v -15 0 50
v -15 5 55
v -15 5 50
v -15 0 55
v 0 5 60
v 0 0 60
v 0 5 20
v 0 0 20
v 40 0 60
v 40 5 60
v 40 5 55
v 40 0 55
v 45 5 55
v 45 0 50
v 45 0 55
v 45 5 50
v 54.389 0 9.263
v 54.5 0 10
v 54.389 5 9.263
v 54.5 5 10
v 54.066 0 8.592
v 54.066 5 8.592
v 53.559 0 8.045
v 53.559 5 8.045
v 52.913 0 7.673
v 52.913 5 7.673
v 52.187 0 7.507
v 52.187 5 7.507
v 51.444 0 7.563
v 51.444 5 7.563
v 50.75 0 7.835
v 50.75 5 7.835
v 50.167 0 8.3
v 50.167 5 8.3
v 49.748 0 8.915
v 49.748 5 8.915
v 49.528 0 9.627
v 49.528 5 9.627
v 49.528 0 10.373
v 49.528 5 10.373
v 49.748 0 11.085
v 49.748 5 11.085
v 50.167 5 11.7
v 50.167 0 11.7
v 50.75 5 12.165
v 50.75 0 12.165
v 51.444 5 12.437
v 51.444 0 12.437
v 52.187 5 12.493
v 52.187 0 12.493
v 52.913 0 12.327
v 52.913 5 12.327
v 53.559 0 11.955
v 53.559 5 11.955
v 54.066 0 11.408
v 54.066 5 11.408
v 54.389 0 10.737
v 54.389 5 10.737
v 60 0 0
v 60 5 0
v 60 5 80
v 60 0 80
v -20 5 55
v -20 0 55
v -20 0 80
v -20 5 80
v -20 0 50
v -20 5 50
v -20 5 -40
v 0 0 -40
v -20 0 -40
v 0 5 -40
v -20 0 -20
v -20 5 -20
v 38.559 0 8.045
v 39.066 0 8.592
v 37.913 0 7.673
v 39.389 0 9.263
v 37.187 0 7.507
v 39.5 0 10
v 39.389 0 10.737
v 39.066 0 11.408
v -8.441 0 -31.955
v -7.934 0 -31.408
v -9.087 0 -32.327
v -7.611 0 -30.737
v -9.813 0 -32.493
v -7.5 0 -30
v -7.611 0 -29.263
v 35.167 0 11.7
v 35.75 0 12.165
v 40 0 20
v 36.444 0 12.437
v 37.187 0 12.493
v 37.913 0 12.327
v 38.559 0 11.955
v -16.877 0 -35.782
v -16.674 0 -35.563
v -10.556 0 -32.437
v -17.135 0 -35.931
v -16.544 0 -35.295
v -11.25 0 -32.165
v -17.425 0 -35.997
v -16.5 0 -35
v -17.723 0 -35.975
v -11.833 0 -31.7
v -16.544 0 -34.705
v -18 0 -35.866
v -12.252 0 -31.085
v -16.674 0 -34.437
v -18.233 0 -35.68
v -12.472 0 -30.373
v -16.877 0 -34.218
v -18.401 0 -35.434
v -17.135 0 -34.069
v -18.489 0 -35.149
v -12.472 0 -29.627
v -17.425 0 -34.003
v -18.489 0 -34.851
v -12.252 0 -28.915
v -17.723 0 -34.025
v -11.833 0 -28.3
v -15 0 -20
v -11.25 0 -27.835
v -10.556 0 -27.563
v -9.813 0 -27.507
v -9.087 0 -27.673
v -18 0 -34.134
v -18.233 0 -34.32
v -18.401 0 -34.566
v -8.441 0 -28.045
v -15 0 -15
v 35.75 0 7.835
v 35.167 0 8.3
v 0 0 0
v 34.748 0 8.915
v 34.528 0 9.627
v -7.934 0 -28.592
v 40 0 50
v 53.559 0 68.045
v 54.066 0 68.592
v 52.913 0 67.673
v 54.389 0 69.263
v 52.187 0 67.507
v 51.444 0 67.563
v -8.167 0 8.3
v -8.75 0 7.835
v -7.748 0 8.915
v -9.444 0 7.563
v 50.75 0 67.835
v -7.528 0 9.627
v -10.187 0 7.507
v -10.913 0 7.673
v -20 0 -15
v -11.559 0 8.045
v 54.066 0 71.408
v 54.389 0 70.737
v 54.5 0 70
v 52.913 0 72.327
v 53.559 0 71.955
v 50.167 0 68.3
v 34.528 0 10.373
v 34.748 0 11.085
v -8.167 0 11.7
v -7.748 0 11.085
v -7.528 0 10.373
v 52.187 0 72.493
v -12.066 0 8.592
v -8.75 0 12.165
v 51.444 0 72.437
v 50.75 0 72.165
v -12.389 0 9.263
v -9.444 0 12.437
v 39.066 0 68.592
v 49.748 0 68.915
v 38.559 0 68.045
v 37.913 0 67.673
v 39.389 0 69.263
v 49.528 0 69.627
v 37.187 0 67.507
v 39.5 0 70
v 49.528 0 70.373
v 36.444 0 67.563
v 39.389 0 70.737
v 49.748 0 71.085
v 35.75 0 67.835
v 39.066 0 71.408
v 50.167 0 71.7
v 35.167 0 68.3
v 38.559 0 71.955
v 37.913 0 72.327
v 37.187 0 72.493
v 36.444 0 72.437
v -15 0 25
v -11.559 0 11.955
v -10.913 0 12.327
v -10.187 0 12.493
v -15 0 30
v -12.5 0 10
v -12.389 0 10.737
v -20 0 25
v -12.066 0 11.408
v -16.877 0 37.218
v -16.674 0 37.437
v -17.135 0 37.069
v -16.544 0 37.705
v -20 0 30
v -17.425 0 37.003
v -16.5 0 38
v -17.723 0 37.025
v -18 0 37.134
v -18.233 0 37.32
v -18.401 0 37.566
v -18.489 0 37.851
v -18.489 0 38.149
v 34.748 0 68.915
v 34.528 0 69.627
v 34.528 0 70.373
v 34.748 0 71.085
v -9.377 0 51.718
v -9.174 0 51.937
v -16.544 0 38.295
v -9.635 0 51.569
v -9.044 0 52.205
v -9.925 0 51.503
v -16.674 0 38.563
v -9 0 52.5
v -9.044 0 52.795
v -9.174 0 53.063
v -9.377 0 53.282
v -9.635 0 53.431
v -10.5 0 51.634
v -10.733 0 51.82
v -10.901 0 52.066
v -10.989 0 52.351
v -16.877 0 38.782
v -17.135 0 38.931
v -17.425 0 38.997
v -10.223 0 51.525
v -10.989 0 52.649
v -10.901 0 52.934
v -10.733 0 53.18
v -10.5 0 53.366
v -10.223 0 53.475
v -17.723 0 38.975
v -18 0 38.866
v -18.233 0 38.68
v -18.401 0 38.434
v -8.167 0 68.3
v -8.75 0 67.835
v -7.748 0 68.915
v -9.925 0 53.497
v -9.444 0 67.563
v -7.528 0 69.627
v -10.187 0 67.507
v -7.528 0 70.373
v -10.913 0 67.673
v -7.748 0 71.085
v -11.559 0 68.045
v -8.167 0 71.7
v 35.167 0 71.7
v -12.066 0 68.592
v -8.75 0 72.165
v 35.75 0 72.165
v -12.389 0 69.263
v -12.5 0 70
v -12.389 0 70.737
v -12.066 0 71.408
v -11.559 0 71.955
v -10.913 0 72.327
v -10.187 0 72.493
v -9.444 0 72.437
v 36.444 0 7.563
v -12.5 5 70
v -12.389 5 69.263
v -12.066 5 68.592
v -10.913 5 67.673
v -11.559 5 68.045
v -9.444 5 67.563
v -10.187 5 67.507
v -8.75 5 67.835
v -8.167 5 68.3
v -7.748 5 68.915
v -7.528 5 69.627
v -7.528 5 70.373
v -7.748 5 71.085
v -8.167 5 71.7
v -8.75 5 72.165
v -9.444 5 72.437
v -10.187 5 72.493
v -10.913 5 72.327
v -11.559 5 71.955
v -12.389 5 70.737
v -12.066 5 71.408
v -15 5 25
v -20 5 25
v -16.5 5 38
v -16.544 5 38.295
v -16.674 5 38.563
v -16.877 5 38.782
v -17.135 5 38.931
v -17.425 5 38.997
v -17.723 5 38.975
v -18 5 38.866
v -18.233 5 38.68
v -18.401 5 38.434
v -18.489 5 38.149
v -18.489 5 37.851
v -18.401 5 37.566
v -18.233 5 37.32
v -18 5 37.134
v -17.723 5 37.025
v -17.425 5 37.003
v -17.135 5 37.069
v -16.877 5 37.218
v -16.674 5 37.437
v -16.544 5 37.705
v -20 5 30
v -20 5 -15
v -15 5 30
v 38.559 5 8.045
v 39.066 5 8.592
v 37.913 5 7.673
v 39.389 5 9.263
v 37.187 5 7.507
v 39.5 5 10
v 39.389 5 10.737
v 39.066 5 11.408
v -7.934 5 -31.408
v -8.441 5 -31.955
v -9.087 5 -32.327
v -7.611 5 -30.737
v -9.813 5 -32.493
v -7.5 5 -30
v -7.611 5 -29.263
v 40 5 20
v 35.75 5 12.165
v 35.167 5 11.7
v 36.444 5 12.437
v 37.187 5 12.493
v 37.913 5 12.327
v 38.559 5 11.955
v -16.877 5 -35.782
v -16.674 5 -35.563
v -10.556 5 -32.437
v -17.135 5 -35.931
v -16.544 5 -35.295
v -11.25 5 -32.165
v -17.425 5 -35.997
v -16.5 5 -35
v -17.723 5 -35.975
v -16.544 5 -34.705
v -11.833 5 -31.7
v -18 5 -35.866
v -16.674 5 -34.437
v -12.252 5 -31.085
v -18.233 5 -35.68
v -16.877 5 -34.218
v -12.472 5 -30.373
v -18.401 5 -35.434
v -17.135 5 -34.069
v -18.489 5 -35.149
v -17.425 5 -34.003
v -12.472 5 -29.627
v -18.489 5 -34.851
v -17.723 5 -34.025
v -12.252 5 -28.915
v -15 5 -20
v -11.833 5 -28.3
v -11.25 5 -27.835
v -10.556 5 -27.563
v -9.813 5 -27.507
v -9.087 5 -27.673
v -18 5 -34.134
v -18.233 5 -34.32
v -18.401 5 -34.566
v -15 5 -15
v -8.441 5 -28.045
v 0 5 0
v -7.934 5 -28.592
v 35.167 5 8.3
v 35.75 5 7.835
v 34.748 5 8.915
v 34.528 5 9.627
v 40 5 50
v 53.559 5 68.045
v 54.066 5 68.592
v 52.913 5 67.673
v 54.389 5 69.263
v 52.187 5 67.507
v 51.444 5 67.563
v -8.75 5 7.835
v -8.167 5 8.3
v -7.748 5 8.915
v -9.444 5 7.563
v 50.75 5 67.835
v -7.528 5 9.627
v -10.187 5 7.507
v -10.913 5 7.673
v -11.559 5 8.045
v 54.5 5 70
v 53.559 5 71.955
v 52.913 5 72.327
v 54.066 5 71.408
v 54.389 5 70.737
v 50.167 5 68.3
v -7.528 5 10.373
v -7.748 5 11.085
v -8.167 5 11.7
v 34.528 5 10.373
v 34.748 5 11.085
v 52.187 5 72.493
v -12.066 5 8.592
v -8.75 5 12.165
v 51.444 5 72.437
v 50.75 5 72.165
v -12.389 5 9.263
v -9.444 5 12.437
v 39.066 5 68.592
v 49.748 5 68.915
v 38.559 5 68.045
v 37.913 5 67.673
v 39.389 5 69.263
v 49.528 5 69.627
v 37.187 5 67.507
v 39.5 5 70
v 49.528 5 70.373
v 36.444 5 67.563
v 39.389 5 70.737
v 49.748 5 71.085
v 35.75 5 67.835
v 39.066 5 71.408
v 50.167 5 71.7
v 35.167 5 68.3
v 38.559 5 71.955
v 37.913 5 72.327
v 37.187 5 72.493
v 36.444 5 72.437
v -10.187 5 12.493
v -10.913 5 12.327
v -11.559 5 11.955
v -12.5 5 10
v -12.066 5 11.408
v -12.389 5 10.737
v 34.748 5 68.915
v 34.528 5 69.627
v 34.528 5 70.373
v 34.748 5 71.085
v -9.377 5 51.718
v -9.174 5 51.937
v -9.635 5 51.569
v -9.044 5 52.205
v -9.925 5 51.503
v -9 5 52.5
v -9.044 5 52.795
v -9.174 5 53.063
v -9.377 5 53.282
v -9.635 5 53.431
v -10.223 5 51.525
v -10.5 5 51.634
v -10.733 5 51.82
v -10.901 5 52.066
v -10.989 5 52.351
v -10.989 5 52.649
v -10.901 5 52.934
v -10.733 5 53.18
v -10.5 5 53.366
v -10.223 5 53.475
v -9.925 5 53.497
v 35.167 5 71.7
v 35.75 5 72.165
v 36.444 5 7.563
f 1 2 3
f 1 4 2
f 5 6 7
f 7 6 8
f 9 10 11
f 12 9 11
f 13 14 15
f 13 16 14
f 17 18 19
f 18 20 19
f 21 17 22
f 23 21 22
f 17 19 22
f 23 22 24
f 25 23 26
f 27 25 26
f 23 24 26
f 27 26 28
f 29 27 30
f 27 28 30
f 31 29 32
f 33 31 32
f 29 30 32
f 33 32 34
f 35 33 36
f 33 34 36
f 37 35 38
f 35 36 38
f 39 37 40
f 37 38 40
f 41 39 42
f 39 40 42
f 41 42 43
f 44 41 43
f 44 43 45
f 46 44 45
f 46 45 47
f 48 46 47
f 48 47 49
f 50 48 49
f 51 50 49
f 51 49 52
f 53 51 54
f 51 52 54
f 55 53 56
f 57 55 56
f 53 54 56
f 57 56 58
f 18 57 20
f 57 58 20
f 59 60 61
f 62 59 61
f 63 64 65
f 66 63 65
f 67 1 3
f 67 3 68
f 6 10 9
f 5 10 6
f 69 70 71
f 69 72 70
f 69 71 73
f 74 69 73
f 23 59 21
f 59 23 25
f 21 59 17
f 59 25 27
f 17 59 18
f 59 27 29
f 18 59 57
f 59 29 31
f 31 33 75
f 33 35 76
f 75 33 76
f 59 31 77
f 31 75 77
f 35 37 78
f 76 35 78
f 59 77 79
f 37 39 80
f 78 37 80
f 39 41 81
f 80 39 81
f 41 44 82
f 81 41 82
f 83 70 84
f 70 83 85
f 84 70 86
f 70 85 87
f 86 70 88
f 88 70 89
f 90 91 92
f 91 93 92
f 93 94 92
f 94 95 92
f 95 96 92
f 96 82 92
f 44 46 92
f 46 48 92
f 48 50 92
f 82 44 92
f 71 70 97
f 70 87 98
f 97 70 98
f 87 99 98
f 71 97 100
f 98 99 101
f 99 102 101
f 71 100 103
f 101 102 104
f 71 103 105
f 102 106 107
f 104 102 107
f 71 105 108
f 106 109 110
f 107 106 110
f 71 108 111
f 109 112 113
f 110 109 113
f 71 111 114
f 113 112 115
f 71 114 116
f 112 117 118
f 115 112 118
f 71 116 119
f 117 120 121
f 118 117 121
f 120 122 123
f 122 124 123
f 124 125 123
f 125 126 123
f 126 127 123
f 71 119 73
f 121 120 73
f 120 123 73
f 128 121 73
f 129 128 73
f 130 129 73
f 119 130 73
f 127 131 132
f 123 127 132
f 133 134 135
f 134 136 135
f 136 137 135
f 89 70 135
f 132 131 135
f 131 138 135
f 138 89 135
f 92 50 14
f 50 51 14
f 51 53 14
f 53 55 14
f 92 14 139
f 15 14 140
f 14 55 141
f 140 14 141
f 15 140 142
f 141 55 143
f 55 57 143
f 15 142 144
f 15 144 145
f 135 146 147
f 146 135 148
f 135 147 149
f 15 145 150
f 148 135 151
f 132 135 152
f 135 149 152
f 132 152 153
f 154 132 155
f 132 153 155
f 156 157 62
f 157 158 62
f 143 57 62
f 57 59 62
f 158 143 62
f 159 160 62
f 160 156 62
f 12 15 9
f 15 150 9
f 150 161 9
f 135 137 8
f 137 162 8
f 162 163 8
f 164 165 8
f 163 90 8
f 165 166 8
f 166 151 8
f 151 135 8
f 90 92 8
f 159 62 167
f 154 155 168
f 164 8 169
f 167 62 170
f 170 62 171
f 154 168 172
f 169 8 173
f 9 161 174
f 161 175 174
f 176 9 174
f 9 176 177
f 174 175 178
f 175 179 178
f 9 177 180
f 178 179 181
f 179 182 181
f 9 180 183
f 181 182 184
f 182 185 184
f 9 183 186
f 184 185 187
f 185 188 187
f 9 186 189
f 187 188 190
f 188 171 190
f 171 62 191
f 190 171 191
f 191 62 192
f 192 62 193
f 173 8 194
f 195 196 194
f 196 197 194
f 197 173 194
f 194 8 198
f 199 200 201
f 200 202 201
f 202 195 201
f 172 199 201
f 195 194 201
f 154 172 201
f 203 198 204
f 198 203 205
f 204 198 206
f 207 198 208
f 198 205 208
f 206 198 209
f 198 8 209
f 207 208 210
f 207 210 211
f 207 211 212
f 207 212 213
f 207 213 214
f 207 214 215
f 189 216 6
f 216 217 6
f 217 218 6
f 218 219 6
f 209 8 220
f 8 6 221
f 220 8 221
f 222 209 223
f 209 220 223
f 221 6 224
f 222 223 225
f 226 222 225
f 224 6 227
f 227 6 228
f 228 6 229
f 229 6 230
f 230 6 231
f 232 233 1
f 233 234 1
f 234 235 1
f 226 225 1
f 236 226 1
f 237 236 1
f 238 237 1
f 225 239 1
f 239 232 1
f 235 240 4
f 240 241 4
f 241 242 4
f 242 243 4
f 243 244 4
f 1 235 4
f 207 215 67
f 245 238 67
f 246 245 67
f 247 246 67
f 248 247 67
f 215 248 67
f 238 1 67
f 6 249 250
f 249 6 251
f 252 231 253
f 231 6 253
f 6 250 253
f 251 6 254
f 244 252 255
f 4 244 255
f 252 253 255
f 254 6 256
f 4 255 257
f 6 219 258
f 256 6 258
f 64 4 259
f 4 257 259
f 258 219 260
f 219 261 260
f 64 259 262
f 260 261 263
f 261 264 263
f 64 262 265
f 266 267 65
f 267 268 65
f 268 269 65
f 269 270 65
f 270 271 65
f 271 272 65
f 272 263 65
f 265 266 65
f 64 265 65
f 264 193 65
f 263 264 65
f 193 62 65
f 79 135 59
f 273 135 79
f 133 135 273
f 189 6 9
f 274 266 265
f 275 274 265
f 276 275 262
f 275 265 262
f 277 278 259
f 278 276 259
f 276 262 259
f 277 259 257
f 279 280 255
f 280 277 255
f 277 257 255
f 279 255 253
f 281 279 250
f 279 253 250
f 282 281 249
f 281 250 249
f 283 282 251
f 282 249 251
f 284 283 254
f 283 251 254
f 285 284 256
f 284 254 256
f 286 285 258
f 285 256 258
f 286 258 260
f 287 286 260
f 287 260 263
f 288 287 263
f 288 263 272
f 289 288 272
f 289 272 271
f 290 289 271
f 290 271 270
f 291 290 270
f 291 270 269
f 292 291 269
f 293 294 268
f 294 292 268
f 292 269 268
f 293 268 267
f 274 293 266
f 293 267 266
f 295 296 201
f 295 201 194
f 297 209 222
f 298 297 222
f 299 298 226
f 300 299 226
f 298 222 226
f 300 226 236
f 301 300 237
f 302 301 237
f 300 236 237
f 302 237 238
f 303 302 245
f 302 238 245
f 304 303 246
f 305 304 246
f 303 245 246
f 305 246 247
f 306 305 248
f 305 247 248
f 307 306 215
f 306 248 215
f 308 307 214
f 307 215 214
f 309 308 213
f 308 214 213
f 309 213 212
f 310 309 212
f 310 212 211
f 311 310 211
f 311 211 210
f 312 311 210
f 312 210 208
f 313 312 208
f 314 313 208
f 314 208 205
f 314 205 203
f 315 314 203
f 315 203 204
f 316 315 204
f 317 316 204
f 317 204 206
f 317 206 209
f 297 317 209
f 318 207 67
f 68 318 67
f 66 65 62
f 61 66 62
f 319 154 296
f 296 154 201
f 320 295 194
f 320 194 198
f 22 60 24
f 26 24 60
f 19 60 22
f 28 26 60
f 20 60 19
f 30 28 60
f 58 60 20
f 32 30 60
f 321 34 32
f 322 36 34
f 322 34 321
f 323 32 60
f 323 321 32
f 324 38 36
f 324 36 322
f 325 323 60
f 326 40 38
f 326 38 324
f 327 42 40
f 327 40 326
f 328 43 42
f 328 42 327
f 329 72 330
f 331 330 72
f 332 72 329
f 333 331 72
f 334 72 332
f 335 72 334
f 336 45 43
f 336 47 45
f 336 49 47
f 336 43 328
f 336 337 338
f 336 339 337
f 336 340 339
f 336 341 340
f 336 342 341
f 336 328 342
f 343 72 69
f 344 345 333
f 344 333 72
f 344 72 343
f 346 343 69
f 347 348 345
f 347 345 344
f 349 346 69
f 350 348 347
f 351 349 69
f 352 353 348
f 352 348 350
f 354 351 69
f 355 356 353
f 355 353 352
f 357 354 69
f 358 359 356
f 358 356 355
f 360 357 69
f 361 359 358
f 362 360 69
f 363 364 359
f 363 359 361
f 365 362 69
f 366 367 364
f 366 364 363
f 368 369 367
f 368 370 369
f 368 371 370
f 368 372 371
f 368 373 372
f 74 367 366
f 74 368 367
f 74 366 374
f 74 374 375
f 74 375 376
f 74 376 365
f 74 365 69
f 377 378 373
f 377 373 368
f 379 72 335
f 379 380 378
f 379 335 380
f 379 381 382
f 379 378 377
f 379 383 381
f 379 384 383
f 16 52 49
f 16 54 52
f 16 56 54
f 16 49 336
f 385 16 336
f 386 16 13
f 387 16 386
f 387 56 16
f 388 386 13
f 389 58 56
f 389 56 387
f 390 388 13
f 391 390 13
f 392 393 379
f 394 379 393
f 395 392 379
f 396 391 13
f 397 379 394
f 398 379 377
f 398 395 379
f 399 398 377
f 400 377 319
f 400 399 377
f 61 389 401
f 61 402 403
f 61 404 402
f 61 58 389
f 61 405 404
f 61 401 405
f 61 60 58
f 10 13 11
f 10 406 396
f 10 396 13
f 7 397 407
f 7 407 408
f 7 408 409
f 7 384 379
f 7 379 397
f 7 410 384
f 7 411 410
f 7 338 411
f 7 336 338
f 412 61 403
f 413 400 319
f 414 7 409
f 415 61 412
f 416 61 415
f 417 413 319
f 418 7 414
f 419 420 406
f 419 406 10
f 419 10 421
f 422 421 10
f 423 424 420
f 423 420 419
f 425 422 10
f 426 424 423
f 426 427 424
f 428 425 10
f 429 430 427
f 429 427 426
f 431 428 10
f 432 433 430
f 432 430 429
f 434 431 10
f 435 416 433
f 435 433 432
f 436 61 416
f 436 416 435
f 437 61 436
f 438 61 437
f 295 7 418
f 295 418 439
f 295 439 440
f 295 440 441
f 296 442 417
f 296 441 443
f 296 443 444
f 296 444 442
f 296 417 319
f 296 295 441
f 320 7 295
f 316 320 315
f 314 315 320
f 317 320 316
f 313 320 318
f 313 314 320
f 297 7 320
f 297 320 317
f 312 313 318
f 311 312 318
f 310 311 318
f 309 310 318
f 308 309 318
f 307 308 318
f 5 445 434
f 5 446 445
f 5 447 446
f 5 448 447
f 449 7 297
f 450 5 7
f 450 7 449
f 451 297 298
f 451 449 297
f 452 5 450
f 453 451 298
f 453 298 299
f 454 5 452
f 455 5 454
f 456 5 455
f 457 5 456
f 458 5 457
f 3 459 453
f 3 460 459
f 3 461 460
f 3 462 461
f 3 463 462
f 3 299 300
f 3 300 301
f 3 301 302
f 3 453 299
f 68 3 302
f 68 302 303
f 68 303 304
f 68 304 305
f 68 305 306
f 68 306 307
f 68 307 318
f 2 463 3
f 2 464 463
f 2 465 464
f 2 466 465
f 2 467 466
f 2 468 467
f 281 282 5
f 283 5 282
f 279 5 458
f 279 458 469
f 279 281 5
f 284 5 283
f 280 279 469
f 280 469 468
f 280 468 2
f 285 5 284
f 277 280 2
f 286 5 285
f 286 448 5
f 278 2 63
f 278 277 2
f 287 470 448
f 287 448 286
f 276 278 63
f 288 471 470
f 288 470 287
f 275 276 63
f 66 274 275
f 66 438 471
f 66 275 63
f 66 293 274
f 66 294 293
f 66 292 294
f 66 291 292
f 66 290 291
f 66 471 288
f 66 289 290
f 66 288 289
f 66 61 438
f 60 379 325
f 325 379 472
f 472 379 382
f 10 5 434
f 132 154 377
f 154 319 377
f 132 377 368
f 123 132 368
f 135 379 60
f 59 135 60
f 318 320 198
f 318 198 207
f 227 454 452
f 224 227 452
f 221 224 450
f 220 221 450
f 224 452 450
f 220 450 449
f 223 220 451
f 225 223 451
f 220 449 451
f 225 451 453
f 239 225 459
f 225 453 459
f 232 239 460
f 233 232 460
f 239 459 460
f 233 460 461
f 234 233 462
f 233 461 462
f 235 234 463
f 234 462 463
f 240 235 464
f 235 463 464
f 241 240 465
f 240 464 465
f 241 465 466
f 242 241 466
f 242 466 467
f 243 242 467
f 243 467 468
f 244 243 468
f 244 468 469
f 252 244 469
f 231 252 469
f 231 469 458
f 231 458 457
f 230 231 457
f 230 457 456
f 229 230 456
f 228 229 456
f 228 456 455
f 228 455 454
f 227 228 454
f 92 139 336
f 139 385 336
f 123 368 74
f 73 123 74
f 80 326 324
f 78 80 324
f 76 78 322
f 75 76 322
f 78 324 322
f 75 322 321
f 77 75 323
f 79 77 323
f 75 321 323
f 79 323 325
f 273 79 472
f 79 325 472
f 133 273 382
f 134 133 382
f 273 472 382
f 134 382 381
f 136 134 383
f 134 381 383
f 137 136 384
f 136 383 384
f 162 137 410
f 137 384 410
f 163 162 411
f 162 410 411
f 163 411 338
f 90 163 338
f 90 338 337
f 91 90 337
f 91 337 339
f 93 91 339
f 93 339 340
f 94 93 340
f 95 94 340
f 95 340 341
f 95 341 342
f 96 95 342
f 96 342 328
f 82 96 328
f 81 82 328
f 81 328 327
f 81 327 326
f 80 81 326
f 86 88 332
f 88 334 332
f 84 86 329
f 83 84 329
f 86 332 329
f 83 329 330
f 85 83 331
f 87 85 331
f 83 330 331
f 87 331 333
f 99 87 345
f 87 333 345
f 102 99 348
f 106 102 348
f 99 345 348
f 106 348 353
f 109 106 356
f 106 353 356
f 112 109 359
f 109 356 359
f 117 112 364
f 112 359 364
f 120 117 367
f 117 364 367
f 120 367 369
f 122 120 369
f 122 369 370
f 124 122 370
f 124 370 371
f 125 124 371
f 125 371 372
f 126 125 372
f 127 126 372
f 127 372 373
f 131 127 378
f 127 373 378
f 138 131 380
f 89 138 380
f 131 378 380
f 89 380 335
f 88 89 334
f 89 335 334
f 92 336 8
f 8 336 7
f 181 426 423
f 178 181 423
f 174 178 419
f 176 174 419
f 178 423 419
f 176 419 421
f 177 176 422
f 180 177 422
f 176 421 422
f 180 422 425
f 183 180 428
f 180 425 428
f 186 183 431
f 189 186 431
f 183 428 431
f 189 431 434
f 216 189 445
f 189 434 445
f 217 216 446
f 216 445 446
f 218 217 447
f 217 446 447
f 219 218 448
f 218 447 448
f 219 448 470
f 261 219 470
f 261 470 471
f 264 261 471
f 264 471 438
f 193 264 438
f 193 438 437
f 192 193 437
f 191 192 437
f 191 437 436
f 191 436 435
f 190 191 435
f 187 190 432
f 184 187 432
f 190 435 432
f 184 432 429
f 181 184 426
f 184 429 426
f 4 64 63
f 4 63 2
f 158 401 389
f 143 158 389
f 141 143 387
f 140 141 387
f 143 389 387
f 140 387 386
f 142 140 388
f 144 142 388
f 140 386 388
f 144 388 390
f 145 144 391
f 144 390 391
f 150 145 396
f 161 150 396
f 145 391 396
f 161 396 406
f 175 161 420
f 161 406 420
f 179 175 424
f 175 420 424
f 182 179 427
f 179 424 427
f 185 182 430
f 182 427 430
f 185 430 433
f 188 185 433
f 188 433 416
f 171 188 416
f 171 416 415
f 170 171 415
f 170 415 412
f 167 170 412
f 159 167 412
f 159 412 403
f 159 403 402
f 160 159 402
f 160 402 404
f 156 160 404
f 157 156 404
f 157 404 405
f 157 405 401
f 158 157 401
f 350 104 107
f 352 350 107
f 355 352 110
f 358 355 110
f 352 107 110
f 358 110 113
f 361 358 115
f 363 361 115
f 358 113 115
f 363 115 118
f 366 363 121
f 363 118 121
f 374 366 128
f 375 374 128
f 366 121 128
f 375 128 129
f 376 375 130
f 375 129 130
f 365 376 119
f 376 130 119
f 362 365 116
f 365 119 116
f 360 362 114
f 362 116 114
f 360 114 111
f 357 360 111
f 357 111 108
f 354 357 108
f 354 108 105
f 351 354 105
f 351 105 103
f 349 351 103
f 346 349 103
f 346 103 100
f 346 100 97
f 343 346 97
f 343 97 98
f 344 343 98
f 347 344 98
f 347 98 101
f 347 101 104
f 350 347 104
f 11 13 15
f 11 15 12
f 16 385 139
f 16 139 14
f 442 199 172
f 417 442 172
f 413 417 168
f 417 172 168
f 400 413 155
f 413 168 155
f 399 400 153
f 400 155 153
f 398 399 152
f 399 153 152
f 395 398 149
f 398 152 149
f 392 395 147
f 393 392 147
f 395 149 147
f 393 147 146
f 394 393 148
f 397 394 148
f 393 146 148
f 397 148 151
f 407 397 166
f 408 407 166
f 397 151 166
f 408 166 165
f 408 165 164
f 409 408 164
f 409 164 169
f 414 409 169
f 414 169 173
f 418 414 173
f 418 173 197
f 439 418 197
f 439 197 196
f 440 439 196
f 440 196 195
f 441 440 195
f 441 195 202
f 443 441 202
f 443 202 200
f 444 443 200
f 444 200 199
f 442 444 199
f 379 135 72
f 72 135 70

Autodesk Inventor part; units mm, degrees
ref_plane "YZ Plane" through (0, 0, 0) normal (1, 0, 0) x (0, 1, 0)
ref_plane "XZ Plane" through (0, 0, 0) normal (0, 1, 0) x (-1, 0, 0)
ref_plane "XY Plane" through (0, 0, 0) normal (0, 0, 1) x (1, 0, 0)
sketch "Sketch4" plane through (0, 0, 0) normal (0, 1, 0) x (-1, 0, 0)
  line L0 (0, 0) -> (20, 0)
  line L1 (20, 0) -> (20, 80)
  line L2 (20, 80) -> (0, 80)
  line L3 (0, 80) -> (0, 0)
  circle A0 centre (10, 10) radius 2.5
  circle A1 centre (10, 70) radius 2.5
  circle A2 centre (10, 70) radius 2.5
  line L4 (0, 0) -> (20, 0)
  line L5 (20, 0) -> (20, -40)
  line L6 (20, -40) -> (0, -40)
  line L7 (0, -40) -> (0, 0)
  circle A3 centre (10, -30) radius 2.5
  dimension "d0" = 80
  dimension "d3" = 20
  dimension "d4" = 5
  dimension "d5" = 10
  dimension "d6" = 10
  dimension "d7" = 5
  dimension "d8" = 10
  dimension "d9" = 10
  dimension "d12" = 5
  dimension "d13" = 60
  dimension "d16" = 40
  dimension "d17" = 5
  dimension "d18" = 10
  dimension "d19" = 10
extrude "Extrusion3" add sketch "Sketch4" along normal blind 5 contours L3 L2 L1 L0
sketch "Sketch5" plane through (0, 5, 0) normal (0, 1, 0) x (1, 0, 0)
  line L0 (60, -20) -> (-20, -20) projected
  line L1 (-20, -20) -> (-20, 0) projected
  line L2 (60, -20) -> (-20, -20) projected
  line L3 (60, 0) -> (60, -20) projected
  line L4 (-20, 0) -> (60, 0) projected
  circle A0 centre (-10, -70) radius 2.5 projected
  circle A1 centre (-10, -10) radius 2.5 projected
  line L5 (0, 0) -> (-20, 0) projected
  line L6 (-20, 0) -> (-20, -80) projected
  line L7 (-20, -80) -> (0, -80) projected
  line L8 (0, -80) -> (0, 0) projected
  line L9 (-20, 0) -> (0, 0)
  line L10 (0, 0) -> (0, 40)
  line L11 (0, 40) -> (-20, 40)
  line L12 (-20, 40) -> (-20, 0)
  circle A2 centre (-10, 30) radius 2.5
  circle A3 centre (50, -10) radius 2.5 projected
  circle A4 centre (-10, -10) radius 2.5 projected
  circle A5 centre (35, -10) radius 2.5 projected
  dimension "d20" = 40
  dimension "d21" = 5
  dimension "d22" = 10
  dimension "d23" = 10
extrude "Extrusion4" add sketch "Sketch5" against normal blind 5 contours L4 L12 L11 L10
sketch "Sketch6" plane through (0, 5, 0) normal (0, 1, 0) x (1, 0, 0)
  line L0 (-20, 15) -> (-15, 15)
  line L1 (-15, 15) -> (-15, 20)
  line L2 (-15, 20) -> (-20, 20)
  line L3 (-20, 20) -> (-20, 15)
  line L4 (-20, 15) -> (-15, 20) construction
  line L5 (-15, 15) -> (-20, 20) construction
  line L6 (0, 40) -> (-20, 40) projected
  line L7 (-20, 40) -> (-20, -80) projected
  line L8 (-20, -25) -> (-15, -25)
  line L9 (-15, -25) -> (-15, -30)
  line L10 (-15, -30) -> (-20, -30)
  line L11 (-20, -30) -> (-20, -25)
  line L12 (-20, -25) -> (-15, -30) construction
  line L13 (-15, -25) -> (-20, -30) construction
  point P0 (0, 0)
  point P1 (-17.5, 17.5)
  point P2 (-17.5, -27.5)
  dimension "d26" = 5
  dimension "d27" = 5
  dimension "d28" = 20
  dimension "d29" = 5
  dimension "d30" = 5
  dimension "d31" = 40
extrude "Extrusion5" cut sketch "Sketch6" against normal through all
sketch "Sketch7" plane through (0, 5, 0) normal (0, 1, 0) x (1, 0, 0)
  circle A0 centre (-10, -52.5) radius 1
  line L0 (-20, -30) -> (-20, -80) projected
  line L1 (0, 40) -> (-20, 40) projected
  point P0 (0, 0)
  dimension "d34" = 2
  dimension "d35" = 10
  dimension "d36" = 92.5
extrude "Extrusion6" cut sketch "Sketch7" against normal through all
sketch "Sketch8" plane through (0, 0, 0) normal (0, -1, 0) x (1, 0, 0)
  circle A0 centre (-17.5, -35) radius 1
  line L0 (-20, -20) -> (-20, -40) projected
  line L1 (-20, -40) -> (0, -40) projected
  point P0 (0, 0)
  dimension "d39" = 2
  dimension "d40" = 2.5
  dimension "d41" = 5
extrude "Extrusion7" cut sketch "Sketch8" against normal through all
sketch "Sketch9" plane through (0, 0, 0) normal (0, -1, 0) x (1, 0, 0)
  circle A0 centre (-17.5, 38) radius 1
  line L0 (-20, 80) -> (-20, 30) projected
  line L1 (-20, 30) -> (-15, 30) projected
  point P0 (0, 0)
  dimension "d44" = 2
  dimension "d45" = 2.5
  dimension "d46" = 8
extrude "Extrusion8" cut sketch "Sketch9" against normal through all
sketch "Sketch10" plane through (0, 5, 0) normal (0, 1, 0) x (1, 0, 0)
  circle A0 centre (50, -70) radius 2.5 projected
  circle A1 centre (-10, -70) radius 2.5 projected
  circle A2 centre (35, -70) radius 2.5 projected
  line L0 (-20, -80) -> (-20, -60) projected
  line L1 (60, -80) -> (-20, -80) projected
  line L2 (60, -60) -> (60, -80) projected
  line L3 (-20, -60) -> (60, -60) projected
  circle A3 centre (50, -10) radius 2.5 projected
  circle A4 centre (35, -10) radius 2.5 projected
  circle A5 centre (50, -70) radius 2.5 projected
  circle A6 centre (35, -70) radius 2.5 projected
  line L4 (57, 0) -> (27, 0) projected
  line L5 (27, 0) -> (27, -80) projected
  line L6 (27, -80) -> (57, -80) projected
  line L7 (57, -80) -> (57, 0) projected
  circle A7 centre (50, -10) radius 2.5 projected
  circle A8 centre (-10, -10) radius 2.5 projected
  circle A9 centre (35, -10) radius 2.5 projected
  line L8 (-20, -20) -> (-20, 0) projected
  line L9 (60, -20) -> (-20, -20) projected
  line L10 (60, 0) -> (60, -20) projected
  line L11 (-20, 0) -> (60, 0) projected
  line L12 (-20, -80) -> (57, -80)
  line L13 (57, -80) -> (57, -60)
  line L14 (57, -60) -> (-20, -60)
  line L15 (-20, -60) -> (-20, -80)
  line L16 (57, 0) -> (27, 0)
  line L17 (27, 0) -> (27, -80)
  line L18 (27, -80) -> (57, -80)
  line L19 (57, -80) -> (57, 0)
  line L20 (-20, 0) -> (57, 0)
  line L21 (57, 0) -> (57, -20)
  line L22 (57, -20) -> (-20, -20)
  line L23 (-20, -20) -> (-20, 0)
  point P0 (0, 0)
extrude "Extrusion9" [suppressed]
sketch "Sketch11" plane through (0, 0, 0) normal (0, -1, 0) x (1, 0, 0)
  line L0 (-20, 55) -> (-15, 55)
  line L1 (-15, 55) -> (-15, 50)
  line L2 (-15, 50) -> (-20, 50)
  line L3 (-20, 50) -> (-20, 55)
  line L4 (-20, 80) -> (0, 80) projected
  line L5 (-20, 80) -> (-20, 30) projected
  point P0 (0, 0)
  point P1 (57, 80)
  dimension "d51" = 5
  dimension "d52" = 5
  dimension "d53" = 25
extrude "Extrusion10" cut sketch "Sketch11" against normal through all
sketch "Sketch12" plane through (0, 0, 0) normal (0, -1, 0) x (1, 0, 0)
  line L0 (27, 50) -> (32, 50)
  line L1 (32, 50) -> (32, 55)
  line L2 (32, 55) -> (27, 55)
  line L3 (27, 55) -> (27, 50)
  line L4 (-20, 80) -> (-20, 55) projected
  line L5 (-20, 80) -> (0, 80) projected
  point P0 (0, 0)
  point P1 (57, 80)
  dimension "d56" = 5
  dimension "d57" = 5
  dimension "d58" = 47
  dimension "d59" = 25
sketch "Sketch15" plane through (0, 5, 0) normal (0, 1, 0) x (1, 0, 0)
  line L0 (-12.5, -55) -> (-12.5, -103) projected
  line L1 (-5.379, -59) -> (-8.621, -59) projected
  circle A0 centre (-10, -10) radius 2.5 projected
  circle A1 centre (-10, -70) radius 2.5 projected
  circle A2 centre (-10, 30) radius 2.5 projected
  line L2 (-20, -50) -> (-15, -50) projected
  line L3 (-15, -50) -> (-15, -55) projected
  line L4 (-15, -55) -> (-20, -55) projected
  line L5 (-20, -55) -> (-20, -80) projected
  line L6 (-20, -80) -> (0, -80) projected
  line L7 (0, -80) -> (0, 40) projected
  line L8 (0, 40) -> (-20, 40) projected
  line L9 (-20, 20) -> (-15, 20) projected
  line L10 (-15, 20) -> (-15, 15) projected
  line L11 (-15, 15) -> (-20, 15) projected
  line L12 (-20, 15) -> (-20, -25) projected
  line L13 (-20, -25) -> (-15, -25) projected
  line L14 (-15, -25) -> (-15, -30) projected
  line L15 (-15, -30) -> (-20, -30) projected
  line L16 (-20, -30) -> (-20, -50) projected
  circle A3 centre (-10, -52.5) radius 1 projected
  circle A4 centre (-17.5, 35) radius 1 projected
  circle A5 centre (-17.5, -38) radius 1 projected
  line L17 (-20, -80) -> (60, -80)
  line L18 (60, -80) -> (60, -60)
  line L19 (60, -60) -> (-20, -60)
  line L20 (-20, -60) -> (-20, -80)
  line L21 (60, -80) -> (40, -80)
  line L22 (40, -80) -> (40, 0)
  line L23 (40, 0) -> (60, 0)
  line L24 (60, 0) -> (60, -80)
  line L25 (-20, 0) -> (60, 0)
  line L26 (60, 0) -> (60, -20)
  line L27 (60, -20) -> (-20, -20)
  line L28 (-20, -20) -> (-20, 0)
  circle A6 centre (37, -70) radius 2.5
  circle A7 centre (52, -70) radius 2.5
  circle A8 centre (52, -10) radius 2.5
  circle A9 centre (37, -10) radius 2.5
  line L29 (-20, 40) -> (-20, 20) projected
  point P0 (0, 0)
  dimension "d69" = 20
  dimension "d70" = 80
  dimension "d71" = 20
  dimension "d72" = 80
  dimension "d73" = 5
  dimension "d74" = 5
  dimension "d75" = 8
  dimension "d76" = 23
  dimension "d77" = 5
  dimension "d78" = 5
  dimension "d79" = 8
  dimension "d80" = 23
  dimension "d81" = 10
  dimension "d82" = 10
  dimension "d90" = 20
extrude "Extrusion14" add sketch "Sketch15" against normal blind 5 contours L19 L7 L6 L0 | L0 L6 L5 L19 | L19 L22 L17 L7 | L27 L12 L25 L7 | L7 L25 L22 L27 | L22 L27 L24 L19 | L19 L18 L17 L22 | L22 L23 L24 L27
sketch "Sketch16" plane through (0, 5, 0) normal (0, 1, 0) x (1, 0, 0)
  line L0 (45, -55) -> (40, -55)
  line L1 (40, -55) -> (40, -50)
  line L2 (40, -50) -> (45, -50)
  line L3 (45, -50) -> (45, -55)
  line L4 (40, -20) -> (40, -60) projected
  line L5 (-20, -80) -> (60, -80) projected
  point P0 (0, 0)
  dimension "d85" = 5
  dimension "d86" = 5
  dimension "d87" = 25
extrude "Extrusion15" cut sketch "Sketch16" against normal through all
equation "\"d37\" = d36"
properties part number "holdersupport" material "Wood (Birch)"
